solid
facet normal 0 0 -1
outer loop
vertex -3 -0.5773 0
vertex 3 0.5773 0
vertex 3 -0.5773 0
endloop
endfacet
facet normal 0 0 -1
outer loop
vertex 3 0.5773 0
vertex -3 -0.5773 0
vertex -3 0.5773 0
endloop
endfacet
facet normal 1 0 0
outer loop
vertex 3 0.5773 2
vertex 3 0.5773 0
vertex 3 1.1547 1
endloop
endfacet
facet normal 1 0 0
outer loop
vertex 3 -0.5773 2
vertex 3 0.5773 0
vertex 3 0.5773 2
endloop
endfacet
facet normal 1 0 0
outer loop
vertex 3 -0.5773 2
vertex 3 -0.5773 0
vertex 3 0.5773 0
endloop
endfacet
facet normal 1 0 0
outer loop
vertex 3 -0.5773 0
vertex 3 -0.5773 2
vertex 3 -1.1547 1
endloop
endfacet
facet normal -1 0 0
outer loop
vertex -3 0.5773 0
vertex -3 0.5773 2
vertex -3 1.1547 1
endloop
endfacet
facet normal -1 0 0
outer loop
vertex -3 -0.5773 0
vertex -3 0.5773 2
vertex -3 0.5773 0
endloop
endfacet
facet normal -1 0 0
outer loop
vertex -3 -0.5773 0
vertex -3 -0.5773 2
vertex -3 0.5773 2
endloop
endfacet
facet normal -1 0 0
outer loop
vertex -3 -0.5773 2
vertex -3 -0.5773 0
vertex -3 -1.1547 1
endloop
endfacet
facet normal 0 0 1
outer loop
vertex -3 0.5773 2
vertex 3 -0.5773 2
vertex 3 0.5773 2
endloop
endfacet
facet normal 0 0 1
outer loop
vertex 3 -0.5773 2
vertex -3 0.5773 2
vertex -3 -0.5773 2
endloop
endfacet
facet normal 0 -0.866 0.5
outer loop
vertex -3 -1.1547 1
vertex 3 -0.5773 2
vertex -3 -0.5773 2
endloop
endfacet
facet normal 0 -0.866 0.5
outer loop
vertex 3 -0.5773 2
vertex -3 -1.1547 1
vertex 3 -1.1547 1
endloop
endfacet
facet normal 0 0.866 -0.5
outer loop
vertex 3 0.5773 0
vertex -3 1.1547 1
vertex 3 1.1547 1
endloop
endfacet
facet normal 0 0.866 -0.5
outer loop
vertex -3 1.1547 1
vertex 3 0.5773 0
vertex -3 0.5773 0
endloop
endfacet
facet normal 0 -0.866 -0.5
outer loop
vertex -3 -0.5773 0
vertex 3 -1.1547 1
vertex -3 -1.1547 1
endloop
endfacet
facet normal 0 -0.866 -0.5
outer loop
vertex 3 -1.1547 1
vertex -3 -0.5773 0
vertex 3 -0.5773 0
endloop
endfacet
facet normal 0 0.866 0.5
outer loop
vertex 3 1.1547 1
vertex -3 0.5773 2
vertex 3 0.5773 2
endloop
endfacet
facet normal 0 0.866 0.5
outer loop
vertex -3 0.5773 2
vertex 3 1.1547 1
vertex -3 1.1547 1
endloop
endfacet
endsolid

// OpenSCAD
//============================================================
// OpenSCAD
// Licence : LICENCE PUBLIQUE RIEN À BRANLER
// Licence : do What The Fuck you want to Public License
//============================================================
/*

	Usage:
	use <Hexagones.scad>;
	Pour créer des jeux, des têtes de vis...

*/


//------------------------------------------------------------
// Demo
//------------------------------------------------------------
$fn = 150 ;			// OpenSCAD Resolution
// hexagone de 1 pouce (1 inch) soit 25.4 mm
Hexagone(cle=2,h=6);

//------------------------------------------------------------
// Hexagone
// cle	écart, ex: clé de 12 alors cle=12
// h		hauteur
//------------------------------------------------------------
module Hexagone(cle,h)
{
	angle = 360/6;		// 6 pans
	cote = cle * cot(angle);
	echo(angle, cot(angle), cote);
	echo(acos(.6));

    translate([0,0,1]) {
        rotate([0,90,0]) {
            union()
            {
                rotate([0,0,0])
                    cube([cle,cote,h],center=true);
                rotate([0,0,angle])
                    cube([cle,cote,h],center=true);
                rotate([0,0,2*angle])
                    cube([cle,cote,h],center=true);
            }
        }
    }

// Vérification par un cercle de taille cle
//	#cylinder(r=cle/2,h=2*h,center=true);
//	%circle(r=cote,center=true);
//	#cube([cote,cote,1]);
}

//------------------------------------------------------------
// Fonction cotangente
// Permet d'avoir les bones dimensions
// utiliser $fn n'est pas bon
//------------------------------------------------------------
function cot(x)=1/tan(x);

//==EOF=======================================================
